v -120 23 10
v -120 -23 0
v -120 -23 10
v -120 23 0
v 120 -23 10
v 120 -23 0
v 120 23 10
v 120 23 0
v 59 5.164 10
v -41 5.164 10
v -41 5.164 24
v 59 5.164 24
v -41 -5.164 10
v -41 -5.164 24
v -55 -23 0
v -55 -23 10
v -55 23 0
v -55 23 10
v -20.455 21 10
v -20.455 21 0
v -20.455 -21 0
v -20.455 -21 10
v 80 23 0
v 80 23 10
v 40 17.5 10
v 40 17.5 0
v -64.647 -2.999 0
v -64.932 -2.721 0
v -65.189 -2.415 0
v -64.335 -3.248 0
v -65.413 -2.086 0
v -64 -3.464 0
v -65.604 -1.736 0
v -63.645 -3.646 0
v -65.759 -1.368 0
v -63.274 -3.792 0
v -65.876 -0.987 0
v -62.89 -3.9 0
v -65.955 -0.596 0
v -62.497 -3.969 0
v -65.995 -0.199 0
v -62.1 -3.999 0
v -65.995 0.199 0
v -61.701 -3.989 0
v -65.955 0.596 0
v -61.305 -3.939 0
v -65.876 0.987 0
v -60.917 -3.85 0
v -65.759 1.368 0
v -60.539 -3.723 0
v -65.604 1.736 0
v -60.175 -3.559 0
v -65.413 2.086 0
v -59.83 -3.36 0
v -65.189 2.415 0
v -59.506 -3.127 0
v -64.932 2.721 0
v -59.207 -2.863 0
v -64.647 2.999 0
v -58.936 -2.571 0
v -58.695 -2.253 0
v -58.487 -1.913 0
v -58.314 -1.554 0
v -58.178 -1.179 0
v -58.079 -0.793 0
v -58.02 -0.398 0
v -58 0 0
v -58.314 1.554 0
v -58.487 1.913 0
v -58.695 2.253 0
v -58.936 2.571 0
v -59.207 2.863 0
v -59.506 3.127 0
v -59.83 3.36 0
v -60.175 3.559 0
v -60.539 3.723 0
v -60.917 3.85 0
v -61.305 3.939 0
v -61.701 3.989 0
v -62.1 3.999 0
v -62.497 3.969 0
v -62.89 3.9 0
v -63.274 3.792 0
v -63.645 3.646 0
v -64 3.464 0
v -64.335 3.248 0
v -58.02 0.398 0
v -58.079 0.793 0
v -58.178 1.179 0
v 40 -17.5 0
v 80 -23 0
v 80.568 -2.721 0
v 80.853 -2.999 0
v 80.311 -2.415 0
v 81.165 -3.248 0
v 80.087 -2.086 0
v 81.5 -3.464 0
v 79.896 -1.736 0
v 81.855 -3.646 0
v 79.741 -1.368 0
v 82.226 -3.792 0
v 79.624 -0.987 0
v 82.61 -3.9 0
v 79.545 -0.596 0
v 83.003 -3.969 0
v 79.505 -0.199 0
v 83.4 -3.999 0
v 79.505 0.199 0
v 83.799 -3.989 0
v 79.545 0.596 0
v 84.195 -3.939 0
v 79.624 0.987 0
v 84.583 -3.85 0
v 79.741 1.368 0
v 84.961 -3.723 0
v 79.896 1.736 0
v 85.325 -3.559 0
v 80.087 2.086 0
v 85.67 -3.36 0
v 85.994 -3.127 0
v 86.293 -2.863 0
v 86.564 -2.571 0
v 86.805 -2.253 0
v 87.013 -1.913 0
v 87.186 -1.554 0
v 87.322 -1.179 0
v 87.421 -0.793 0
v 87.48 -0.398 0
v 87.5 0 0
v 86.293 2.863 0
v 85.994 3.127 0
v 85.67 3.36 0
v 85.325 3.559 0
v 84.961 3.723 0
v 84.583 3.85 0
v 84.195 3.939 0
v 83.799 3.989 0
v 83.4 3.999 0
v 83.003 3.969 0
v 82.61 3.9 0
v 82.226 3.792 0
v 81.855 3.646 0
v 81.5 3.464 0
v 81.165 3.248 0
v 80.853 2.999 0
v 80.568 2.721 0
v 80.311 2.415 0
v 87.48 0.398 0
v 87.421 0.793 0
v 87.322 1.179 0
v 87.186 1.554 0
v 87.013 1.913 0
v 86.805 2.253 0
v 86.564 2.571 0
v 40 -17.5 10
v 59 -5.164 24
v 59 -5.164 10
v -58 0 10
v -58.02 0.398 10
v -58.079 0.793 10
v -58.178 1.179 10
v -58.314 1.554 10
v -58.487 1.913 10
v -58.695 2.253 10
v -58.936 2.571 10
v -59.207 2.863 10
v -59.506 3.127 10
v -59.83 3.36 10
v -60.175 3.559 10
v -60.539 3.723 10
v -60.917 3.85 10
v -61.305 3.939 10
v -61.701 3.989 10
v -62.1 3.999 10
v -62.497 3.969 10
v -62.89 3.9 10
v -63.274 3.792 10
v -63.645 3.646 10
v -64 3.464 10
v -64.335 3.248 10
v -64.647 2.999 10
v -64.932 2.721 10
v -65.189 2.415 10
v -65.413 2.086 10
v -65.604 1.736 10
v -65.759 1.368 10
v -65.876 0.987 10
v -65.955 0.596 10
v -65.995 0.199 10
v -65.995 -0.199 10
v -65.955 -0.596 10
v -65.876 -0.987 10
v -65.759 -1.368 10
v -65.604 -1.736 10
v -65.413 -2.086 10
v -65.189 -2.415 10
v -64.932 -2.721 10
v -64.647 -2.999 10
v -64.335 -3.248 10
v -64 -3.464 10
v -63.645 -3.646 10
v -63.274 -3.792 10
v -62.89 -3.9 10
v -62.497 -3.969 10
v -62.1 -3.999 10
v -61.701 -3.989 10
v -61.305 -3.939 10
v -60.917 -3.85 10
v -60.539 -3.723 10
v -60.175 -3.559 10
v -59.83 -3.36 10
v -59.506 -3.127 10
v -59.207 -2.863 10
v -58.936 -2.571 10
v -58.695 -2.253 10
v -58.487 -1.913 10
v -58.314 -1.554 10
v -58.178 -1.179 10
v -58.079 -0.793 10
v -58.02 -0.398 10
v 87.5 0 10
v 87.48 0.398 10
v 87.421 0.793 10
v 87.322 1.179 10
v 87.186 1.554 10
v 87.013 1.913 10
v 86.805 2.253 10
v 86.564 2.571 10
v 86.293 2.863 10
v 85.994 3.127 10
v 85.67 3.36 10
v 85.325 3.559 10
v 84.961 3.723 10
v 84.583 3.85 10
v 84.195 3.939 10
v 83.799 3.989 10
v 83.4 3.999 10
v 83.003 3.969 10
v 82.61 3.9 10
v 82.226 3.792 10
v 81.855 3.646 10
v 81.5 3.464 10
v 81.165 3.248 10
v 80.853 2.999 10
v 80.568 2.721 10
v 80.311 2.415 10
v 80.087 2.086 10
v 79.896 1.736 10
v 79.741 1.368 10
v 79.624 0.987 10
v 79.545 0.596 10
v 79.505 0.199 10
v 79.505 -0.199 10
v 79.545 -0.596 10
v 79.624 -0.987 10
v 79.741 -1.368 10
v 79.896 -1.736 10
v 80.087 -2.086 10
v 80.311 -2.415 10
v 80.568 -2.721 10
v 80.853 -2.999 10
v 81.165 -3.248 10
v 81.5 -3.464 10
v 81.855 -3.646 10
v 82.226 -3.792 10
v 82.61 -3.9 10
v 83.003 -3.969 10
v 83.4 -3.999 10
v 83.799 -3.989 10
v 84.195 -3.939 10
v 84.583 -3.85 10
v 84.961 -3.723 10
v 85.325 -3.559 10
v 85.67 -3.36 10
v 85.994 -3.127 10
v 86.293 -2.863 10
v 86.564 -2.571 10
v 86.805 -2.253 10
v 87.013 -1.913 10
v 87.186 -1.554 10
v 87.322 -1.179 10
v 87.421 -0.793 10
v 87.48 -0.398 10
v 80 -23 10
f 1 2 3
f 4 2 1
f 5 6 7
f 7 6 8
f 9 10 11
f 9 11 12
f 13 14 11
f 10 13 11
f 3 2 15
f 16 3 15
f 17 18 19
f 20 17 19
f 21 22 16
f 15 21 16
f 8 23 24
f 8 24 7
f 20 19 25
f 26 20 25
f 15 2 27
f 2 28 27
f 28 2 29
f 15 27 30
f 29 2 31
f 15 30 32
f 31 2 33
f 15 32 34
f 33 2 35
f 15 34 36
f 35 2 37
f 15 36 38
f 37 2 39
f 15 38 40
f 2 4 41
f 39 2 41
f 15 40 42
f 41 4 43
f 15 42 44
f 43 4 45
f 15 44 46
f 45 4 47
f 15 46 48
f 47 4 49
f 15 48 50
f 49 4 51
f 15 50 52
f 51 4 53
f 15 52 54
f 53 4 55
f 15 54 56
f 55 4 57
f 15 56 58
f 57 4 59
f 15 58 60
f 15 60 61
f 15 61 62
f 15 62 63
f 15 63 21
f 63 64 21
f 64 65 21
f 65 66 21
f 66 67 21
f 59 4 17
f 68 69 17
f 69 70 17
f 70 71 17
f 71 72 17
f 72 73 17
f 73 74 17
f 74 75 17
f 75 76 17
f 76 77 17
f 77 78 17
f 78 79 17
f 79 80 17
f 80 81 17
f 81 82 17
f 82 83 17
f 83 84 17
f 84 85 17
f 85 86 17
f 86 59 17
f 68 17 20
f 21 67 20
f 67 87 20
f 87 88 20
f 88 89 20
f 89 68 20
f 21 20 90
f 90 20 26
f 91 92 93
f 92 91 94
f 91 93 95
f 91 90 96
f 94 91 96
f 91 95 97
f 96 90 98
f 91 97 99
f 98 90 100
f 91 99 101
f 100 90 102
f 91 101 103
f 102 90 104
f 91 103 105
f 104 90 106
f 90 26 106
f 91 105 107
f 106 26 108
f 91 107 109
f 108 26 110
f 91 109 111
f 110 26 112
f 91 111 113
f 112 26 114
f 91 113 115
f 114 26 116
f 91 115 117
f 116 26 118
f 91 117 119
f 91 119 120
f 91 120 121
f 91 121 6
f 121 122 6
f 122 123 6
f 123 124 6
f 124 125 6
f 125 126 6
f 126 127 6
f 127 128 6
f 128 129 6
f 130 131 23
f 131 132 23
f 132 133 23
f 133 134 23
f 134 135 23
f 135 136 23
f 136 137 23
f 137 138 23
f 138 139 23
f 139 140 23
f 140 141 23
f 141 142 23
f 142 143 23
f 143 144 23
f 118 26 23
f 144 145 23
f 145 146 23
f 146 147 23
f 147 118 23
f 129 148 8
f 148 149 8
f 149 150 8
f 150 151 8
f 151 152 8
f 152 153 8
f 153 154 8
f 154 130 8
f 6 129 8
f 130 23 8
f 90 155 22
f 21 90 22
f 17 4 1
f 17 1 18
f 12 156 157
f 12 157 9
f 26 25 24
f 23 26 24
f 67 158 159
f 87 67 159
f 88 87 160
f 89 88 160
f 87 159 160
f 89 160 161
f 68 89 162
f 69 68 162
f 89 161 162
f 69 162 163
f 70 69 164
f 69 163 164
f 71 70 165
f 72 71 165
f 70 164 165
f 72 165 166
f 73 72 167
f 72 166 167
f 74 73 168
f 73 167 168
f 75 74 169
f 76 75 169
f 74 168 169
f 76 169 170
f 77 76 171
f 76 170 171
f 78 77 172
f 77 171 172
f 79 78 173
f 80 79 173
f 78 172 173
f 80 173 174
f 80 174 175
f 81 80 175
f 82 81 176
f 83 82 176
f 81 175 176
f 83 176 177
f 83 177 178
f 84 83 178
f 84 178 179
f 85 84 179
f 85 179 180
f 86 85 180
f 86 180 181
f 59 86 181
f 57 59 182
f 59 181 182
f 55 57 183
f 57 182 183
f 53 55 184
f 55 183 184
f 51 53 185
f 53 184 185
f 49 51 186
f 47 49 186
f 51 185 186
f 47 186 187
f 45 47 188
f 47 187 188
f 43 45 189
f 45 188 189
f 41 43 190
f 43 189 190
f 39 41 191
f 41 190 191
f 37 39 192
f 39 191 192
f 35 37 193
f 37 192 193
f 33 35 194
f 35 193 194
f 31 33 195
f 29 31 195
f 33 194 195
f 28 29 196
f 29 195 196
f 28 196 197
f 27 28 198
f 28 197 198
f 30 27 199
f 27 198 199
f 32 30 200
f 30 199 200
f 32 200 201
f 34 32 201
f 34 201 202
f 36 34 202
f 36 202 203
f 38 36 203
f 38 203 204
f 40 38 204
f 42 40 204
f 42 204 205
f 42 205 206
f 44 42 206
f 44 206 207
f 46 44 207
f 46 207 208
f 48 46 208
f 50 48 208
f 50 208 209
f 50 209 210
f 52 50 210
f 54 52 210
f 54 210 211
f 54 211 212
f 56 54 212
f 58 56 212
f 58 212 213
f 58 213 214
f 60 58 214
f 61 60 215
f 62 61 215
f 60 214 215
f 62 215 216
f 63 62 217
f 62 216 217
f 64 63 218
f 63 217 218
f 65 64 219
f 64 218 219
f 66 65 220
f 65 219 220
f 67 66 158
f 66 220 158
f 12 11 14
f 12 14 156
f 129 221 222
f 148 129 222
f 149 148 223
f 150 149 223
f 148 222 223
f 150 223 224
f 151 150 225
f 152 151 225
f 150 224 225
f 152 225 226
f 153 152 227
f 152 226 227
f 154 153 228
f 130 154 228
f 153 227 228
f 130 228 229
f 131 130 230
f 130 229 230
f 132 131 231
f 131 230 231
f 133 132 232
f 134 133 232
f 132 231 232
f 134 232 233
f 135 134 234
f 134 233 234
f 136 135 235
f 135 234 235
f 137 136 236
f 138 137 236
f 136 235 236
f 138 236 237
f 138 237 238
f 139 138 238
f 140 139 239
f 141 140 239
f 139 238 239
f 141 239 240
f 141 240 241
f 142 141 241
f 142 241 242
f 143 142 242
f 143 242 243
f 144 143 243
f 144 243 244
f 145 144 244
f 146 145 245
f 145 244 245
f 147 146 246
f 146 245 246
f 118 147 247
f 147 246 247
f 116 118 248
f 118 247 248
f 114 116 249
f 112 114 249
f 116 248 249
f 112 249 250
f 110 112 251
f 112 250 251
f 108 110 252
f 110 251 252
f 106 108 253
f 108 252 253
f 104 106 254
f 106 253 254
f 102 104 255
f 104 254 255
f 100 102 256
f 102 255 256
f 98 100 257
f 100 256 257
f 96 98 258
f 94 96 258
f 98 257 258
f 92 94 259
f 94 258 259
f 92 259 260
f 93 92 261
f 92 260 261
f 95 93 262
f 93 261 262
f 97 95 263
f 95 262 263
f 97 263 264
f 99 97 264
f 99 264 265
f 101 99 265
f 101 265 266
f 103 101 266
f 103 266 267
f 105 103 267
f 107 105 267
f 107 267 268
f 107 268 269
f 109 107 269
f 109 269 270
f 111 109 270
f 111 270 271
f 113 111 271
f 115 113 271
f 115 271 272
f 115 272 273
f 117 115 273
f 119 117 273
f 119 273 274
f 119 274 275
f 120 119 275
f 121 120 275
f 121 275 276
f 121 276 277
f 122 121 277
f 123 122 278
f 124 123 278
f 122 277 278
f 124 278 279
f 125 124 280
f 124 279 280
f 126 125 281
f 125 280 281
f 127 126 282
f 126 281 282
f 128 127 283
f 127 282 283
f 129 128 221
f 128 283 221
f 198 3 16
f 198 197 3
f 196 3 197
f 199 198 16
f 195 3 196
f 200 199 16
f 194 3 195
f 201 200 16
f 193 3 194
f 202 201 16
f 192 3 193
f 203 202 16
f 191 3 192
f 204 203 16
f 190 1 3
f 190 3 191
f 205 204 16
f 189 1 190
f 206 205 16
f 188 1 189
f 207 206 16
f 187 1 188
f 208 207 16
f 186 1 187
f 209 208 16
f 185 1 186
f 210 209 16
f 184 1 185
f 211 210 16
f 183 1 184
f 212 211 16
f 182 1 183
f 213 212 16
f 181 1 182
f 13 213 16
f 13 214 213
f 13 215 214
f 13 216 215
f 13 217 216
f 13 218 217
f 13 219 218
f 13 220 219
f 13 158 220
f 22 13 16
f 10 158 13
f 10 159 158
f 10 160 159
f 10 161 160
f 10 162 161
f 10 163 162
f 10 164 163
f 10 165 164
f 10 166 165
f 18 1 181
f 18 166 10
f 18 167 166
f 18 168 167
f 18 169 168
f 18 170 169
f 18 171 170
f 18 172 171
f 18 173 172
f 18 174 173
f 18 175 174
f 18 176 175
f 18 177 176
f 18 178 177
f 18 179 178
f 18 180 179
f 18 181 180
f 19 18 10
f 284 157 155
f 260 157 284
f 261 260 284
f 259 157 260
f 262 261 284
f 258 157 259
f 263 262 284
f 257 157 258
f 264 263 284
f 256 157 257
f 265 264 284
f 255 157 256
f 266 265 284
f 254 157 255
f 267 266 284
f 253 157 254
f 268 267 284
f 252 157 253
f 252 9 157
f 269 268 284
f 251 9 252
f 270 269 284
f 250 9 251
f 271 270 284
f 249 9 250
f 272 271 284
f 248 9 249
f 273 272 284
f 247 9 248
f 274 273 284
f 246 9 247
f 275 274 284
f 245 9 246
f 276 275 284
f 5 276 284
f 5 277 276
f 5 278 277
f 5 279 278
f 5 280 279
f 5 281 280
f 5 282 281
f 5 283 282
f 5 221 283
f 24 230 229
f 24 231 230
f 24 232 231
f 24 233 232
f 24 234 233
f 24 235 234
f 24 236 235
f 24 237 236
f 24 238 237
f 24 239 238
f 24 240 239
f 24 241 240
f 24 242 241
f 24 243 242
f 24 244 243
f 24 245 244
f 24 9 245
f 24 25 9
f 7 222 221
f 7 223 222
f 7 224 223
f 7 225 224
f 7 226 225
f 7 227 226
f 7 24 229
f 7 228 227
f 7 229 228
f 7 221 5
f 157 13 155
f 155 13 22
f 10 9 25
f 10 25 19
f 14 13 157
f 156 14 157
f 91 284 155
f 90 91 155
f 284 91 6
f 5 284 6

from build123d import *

# Parameters (mm, degrees)
SKETCH_1_W          = 240
SKETCH_1_H          = 46
EXTRUDE_1_DEPTH     = 10
CUT_EXTRUDE_1_DEPTH = 10
SKETCH_3_W          = 66.746798051
SKETCH_3_H          = 10
EXTRUDE_3_DEPTH     = 14
SKETCH_5_R          = 12.5
CUT_EXTRUDE_2_DEPTH = 14
SKETCH_6_R          = 4
CUT_EXTRUDE_3_DEPTH = 10
SKETCH_7_W          = 66.746798051
SKETCH_7_H          = 14
CUT_EXTRUDE_4_DEPTH = 10
SKETCH_8_W          = 100
SKETCH_8_H          = 10.327994094
EXTRUDE_4_DEPTH     = 14
SKETCH_9_R          = 12.5
SKETCH_9_R_2        = 4
EXTRUDE_5_DEPTH     = 10


with BuildPart() as part:
    # 草图1 → 凸台-拉伸1 (new body)
    with BuildSketch(Plane.XY):
        Rectangle(SKETCH_1_W, SKETCH_1_H)
    extrude(amount=EXTRUDE_1_DEPTH)

    # 草图2 → 切除-拉伸1 (cut)
    with BuildSketch(Plane.XY.offset(10)):
        Polygon((-55, 23), (-20.454545455, 21), (40, 21), (40, 17.5), (80, 23), align=None)
        Polygon((80, -23), (40, -17.5), (40, -21), (-20.454545455, -21), (-55, -23), align=None)
        Polygon((40, -21), (40, -17.5), (-20.454545455, -21), align=None)
        Polygon((40, 21), (-20.454545455, 21), (40, 17.5), align=None)
    extrude(amount=-CUT_EXTRUDE_1_DEPTH, mode=Mode.SUBTRACT)

    # 草图3 → 凸台-拉伸3 (add)
    with BuildSketch(Plane.XY.offset(10)):
        with Locations((-11.626600974, 0)):
            Rectangle(SKETCH_3_W, SKETCH_3_H)
    extrude(amount=EXTRUDE_3_DEPTH)

    # 草图5 → 切除-拉伸2 (cut)
    with BuildSketch(Plane.XY.offset(10)):
        with Locations((83.5, 0)):
            Circle(SKETCH_5_R)
    extrude(amount=-CUT_EXTRUDE_2_DEPTH, mode=Mode.SUBTRACT)

    # 草图6 → 切除-拉伸3 (cut)
    with BuildSketch(Plane.XY.offset(10)):
        with Locations((-62, 0)):
            Circle(SKETCH_6_R)
    extrude(amount=-CUT_EXTRUDE_3_DEPTH, mode=Mode.SUBTRACT)

    # 草图7 → 切除-拉伸4 (cut)
    with BuildSketch(Plane.XZ.offset(5)):
        with Locations((-11.626600974, 17)):
            Rectangle(SKETCH_7_W, SKETCH_7_H)
    extrude(amount=-CUT_EXTRUDE_4_DEPTH, mode=Mode.SUBTRACT)

    # 草图8 → 凸台-拉伸4 (add)
    with BuildSketch(Plane.XY.offset(10)):
        with Locations((9, 0)):
            Rectangle(SKETCH_8_W, SKETCH_8_H)
    extrude(amount=EXTRUDE_4_DEPTH)

    # 草图9 → 凸台-拉伸5 (add)
    with BuildSketch(Plane.XY.offset(10)):
        with Locations((83.5, 0)):
            Circle(SKETCH_9_R)
        with Locations((83.5, 0)):
            Circle(SKETCH_9_R_2, mode=Mode.SUBTRACT)
    extrude(amount=-EXTRUDE_5_DEPTH)


solid = part.part
